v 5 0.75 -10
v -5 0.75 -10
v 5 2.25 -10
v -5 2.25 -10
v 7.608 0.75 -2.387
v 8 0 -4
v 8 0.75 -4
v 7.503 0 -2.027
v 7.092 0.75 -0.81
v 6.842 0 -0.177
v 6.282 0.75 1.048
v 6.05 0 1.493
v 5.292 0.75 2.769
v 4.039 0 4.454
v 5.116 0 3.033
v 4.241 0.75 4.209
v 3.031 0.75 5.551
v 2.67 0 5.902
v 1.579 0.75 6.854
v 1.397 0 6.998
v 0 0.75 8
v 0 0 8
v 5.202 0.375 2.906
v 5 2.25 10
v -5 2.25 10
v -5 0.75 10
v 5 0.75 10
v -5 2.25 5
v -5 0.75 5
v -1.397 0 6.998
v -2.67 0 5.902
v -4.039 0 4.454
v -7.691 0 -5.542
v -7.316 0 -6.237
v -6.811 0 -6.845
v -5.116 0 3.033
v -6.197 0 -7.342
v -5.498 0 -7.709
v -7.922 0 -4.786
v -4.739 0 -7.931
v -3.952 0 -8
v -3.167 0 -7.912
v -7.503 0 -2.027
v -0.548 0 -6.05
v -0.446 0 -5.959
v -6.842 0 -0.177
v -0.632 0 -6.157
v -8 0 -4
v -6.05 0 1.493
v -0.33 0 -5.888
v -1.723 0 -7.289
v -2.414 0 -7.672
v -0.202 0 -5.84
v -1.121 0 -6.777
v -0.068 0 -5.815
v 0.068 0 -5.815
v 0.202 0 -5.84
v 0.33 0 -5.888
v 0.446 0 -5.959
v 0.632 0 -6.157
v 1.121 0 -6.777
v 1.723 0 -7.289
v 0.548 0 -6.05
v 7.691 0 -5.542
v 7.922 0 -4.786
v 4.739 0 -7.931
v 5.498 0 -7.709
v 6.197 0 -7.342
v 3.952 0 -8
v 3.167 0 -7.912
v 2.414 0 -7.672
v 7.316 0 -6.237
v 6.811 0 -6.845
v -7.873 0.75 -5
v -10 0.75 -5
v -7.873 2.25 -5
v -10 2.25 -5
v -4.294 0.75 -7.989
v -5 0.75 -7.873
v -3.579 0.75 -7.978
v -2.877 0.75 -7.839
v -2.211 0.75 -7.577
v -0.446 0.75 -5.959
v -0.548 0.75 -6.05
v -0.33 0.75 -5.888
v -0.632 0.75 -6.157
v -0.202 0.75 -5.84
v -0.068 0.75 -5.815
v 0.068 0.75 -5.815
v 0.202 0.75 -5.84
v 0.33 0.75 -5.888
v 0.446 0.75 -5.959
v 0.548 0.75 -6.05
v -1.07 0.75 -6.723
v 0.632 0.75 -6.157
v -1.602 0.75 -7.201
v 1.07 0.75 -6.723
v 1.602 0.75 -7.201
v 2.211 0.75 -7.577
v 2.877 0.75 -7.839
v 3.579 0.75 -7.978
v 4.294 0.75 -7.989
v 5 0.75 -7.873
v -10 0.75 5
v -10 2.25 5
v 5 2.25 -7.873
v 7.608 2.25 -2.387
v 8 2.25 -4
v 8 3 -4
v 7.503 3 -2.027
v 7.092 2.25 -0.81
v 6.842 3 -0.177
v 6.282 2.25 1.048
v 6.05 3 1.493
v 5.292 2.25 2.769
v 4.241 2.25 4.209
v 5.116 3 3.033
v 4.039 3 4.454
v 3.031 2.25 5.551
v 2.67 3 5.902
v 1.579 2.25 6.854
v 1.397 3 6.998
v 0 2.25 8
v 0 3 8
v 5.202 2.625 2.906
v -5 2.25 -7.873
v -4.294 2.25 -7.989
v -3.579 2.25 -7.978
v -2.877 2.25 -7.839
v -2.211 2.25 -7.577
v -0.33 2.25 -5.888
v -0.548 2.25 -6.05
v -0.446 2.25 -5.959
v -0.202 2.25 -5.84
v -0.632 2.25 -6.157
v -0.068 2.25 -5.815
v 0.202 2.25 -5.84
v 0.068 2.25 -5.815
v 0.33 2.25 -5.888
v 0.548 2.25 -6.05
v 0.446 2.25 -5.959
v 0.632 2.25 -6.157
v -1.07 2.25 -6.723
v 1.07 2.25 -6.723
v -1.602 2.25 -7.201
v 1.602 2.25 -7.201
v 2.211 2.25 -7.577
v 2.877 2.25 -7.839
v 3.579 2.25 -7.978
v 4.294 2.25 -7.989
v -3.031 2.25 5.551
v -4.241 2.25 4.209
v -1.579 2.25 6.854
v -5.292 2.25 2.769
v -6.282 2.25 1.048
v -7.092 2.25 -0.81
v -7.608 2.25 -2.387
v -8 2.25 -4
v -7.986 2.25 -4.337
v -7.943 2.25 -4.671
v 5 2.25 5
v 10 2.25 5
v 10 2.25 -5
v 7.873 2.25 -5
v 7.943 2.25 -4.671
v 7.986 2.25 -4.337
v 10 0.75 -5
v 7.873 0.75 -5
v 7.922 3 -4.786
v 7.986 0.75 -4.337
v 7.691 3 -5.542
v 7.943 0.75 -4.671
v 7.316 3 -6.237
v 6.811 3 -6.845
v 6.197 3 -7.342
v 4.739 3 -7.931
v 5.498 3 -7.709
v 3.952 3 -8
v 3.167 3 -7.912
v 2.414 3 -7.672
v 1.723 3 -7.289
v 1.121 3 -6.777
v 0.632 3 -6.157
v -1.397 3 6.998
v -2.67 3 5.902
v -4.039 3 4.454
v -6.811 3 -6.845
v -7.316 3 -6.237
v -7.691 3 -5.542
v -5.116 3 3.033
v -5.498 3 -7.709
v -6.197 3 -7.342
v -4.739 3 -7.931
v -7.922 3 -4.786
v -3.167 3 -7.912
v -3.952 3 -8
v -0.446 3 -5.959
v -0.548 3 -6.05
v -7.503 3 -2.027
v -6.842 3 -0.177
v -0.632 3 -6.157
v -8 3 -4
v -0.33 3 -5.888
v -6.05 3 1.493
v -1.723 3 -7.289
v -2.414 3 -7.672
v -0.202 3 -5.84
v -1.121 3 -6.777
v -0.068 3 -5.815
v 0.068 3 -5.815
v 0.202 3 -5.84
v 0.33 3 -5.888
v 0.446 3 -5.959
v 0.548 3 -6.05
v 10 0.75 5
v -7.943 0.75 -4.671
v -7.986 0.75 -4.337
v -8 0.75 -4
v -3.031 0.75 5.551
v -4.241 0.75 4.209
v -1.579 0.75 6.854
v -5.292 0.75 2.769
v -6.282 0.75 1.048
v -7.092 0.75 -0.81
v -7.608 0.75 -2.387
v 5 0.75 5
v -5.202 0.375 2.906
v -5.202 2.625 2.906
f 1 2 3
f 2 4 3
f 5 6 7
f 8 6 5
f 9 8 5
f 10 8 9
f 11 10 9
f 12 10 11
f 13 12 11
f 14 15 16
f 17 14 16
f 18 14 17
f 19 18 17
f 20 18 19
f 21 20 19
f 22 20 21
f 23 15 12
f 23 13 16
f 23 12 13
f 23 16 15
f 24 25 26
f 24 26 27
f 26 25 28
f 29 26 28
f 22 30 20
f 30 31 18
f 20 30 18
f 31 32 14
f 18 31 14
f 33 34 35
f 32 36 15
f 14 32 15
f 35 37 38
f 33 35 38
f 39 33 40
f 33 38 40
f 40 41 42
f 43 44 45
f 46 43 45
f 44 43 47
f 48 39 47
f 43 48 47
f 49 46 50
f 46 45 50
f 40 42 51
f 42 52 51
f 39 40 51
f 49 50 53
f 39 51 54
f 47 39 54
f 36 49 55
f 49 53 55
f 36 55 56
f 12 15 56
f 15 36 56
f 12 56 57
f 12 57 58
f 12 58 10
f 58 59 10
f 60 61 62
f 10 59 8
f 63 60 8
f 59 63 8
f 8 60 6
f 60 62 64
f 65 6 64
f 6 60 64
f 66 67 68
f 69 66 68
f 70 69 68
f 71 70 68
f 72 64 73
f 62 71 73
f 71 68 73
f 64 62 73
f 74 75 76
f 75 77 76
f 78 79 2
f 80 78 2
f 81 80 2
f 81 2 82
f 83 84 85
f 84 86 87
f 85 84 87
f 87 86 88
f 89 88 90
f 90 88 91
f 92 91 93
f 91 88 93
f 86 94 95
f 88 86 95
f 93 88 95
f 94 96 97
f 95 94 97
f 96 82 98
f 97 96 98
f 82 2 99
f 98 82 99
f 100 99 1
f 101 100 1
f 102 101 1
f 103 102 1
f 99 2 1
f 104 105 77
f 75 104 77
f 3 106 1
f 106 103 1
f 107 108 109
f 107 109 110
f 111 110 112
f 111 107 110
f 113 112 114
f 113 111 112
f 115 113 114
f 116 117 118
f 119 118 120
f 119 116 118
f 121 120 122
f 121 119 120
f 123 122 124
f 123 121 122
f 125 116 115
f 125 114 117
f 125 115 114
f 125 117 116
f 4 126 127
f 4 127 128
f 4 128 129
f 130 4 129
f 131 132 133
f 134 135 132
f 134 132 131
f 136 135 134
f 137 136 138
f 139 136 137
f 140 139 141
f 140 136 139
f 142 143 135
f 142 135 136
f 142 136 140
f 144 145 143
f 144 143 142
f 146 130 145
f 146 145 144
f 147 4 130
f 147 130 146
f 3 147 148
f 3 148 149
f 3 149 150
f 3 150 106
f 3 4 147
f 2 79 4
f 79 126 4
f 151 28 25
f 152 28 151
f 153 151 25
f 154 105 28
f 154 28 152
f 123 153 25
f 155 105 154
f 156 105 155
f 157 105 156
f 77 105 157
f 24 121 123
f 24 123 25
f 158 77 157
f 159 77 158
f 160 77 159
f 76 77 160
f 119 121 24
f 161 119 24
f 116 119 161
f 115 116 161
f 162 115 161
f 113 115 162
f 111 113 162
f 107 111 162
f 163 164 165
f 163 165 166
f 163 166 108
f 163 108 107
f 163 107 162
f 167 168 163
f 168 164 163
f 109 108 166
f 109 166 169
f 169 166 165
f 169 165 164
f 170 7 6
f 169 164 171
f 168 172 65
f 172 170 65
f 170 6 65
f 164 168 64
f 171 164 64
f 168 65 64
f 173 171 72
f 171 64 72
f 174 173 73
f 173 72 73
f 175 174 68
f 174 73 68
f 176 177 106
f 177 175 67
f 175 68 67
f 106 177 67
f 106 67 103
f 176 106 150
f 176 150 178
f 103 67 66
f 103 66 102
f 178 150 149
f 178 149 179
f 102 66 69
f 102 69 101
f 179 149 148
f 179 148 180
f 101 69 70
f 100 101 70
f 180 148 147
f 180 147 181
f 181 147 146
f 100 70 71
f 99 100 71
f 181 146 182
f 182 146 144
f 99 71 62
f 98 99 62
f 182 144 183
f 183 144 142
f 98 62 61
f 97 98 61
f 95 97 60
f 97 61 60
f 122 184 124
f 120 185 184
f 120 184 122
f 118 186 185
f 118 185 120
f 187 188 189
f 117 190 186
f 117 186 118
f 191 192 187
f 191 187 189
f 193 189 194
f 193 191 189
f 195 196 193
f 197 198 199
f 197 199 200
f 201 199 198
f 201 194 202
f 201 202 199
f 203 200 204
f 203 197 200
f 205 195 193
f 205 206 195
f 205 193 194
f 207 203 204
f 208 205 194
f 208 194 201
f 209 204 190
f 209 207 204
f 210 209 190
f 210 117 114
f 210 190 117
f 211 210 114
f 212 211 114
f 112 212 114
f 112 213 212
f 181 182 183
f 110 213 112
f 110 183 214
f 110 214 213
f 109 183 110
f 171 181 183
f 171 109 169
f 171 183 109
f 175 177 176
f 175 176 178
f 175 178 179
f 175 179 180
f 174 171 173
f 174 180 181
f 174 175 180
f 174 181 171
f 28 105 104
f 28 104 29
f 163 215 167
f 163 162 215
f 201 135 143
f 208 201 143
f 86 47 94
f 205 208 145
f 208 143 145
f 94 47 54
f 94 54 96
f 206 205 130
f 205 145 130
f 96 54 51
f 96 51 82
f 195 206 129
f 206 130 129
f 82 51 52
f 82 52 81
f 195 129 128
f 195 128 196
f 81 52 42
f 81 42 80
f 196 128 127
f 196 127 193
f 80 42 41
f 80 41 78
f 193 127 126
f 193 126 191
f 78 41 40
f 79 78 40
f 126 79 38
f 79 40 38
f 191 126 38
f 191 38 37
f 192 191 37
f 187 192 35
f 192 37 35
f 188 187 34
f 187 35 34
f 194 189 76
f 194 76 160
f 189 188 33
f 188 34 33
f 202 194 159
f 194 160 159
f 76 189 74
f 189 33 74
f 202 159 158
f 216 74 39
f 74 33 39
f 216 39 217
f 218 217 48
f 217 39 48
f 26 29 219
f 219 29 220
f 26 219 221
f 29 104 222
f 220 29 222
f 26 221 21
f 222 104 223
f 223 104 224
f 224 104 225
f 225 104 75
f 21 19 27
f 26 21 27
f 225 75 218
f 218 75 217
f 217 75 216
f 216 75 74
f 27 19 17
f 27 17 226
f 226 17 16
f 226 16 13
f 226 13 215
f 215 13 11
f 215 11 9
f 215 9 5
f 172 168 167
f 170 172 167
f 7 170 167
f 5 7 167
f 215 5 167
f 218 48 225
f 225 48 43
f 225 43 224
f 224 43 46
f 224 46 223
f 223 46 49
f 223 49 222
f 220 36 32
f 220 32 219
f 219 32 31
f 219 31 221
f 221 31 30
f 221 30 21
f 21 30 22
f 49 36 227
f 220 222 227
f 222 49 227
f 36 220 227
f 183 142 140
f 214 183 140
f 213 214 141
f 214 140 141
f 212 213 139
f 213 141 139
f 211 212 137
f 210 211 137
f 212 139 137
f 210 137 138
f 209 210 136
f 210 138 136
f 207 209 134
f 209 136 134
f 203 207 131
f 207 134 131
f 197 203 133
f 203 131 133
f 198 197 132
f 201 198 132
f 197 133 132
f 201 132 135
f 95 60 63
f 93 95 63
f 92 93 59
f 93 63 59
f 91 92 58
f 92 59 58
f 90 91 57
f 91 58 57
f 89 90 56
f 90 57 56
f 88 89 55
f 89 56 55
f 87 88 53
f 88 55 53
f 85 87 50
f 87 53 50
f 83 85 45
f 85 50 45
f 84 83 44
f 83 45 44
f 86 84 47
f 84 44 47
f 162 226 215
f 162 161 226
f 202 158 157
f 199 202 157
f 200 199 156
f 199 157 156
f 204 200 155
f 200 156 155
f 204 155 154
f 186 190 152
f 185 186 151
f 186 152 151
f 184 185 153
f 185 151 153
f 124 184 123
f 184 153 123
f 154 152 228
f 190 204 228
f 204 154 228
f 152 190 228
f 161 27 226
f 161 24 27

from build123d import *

# Parameters (mm, degrees)
BOSS_EXTRUDE3_DEPTH      = 3
SKETCH2_W                = 8.5
SKETCH2_H                = 10
SKETCH2_W_2              = 10
SKETCH2_H_2              = 20
BOSS_EXTRUDE4_DEPTH      = 0.75
BOSS_EXTRUDE4_DEPTH_BACK = 0.75


with BuildPart() as part:
    # Sketch1 → Boss-Extrude3 (new body)
    with BuildSketch(Plane(origin=(0, 0, 0), x_dir=(1, 0, 0), z_dir=(0, 1, 0))):
        with BuildLine():
            ThreePointArc((-0.631578947, 6.157252793), (-5.123902974, 7.83885948), (-8, 4))
            add(Edge.make_bspline(
                [(-8, 4), (-6.403336947, -3.811544104), (0, -8)],
                knots=[0, 0, 0, 1, 1, 1], degree=2))
            add(Edge.make_bspline(
                [(8, 4), (6.403336947, -3.811544104), (0, -8)],
                knots=[0, 0, 0, 1, 1, 1], degree=2))
            ThreePointArc((8, 4), (5.123902974, 7.83885948), (0.631578947, 6.157252793))
            ThreePointArc((0.631578947, 6.157252793), (0, 5.811737691), (-0.631578947, 6.157252793))
        make_face()
    extrude(amount=BOSS_EXTRUDE3_DEPTH)

    # Sketch2 → Boss-Extrude4 (add, two sides)
    with BuildSketch(Plane(origin=(0, 1.5, 0), x_dir=(1, 0, 0), z_dir=(0, 1, 0))) as boss_extrude4_sk:
        with Locations((-5.75, 0)):
            Rectangle(SKETCH2_W, SKETCH2_H)
        with Locations((5.75, 0)):
            Rectangle(SKETCH2_W, SKETCH2_H)
        Rectangle(SKETCH2_W_2, SKETCH2_H_2)
        with BuildLine():
            ThreePointArc((8, 3.999999998), (5.123902975, 7.838859479), (0.631578947, 6.157252793))
            ThreePointArc((0.631578947, 6.157252793), (0, 5.811737691), (-0.631578947, 6.157252793))
            ThreePointArc((-0.631578947, 6.157252793), (-5.123902974, 7.83885948), (-8, 4))
            add(Edge.make_bspline(
                [(-8, 4), (-6.403336946, -3.811544103), (3e-09, -7.999999998)],
                knots=[0, 0, 0, 1, 1, 1], degree=2))
            add(Edge.make_bspline(
                [(3e-09, -7.999999998), (6.403336946, -3.811544103), (8, 3.999999998)],
                knots=[0, 0, 0, 1, 1, 1], degree=2))
        make_face()
    extrude(amount=BOSS_EXTRUDE4_DEPTH)
    extrude(boss_extrude4_sk.sketch, amount=-BOSS_EXTRUDE4_DEPTH_BACK)


solid = part.part
